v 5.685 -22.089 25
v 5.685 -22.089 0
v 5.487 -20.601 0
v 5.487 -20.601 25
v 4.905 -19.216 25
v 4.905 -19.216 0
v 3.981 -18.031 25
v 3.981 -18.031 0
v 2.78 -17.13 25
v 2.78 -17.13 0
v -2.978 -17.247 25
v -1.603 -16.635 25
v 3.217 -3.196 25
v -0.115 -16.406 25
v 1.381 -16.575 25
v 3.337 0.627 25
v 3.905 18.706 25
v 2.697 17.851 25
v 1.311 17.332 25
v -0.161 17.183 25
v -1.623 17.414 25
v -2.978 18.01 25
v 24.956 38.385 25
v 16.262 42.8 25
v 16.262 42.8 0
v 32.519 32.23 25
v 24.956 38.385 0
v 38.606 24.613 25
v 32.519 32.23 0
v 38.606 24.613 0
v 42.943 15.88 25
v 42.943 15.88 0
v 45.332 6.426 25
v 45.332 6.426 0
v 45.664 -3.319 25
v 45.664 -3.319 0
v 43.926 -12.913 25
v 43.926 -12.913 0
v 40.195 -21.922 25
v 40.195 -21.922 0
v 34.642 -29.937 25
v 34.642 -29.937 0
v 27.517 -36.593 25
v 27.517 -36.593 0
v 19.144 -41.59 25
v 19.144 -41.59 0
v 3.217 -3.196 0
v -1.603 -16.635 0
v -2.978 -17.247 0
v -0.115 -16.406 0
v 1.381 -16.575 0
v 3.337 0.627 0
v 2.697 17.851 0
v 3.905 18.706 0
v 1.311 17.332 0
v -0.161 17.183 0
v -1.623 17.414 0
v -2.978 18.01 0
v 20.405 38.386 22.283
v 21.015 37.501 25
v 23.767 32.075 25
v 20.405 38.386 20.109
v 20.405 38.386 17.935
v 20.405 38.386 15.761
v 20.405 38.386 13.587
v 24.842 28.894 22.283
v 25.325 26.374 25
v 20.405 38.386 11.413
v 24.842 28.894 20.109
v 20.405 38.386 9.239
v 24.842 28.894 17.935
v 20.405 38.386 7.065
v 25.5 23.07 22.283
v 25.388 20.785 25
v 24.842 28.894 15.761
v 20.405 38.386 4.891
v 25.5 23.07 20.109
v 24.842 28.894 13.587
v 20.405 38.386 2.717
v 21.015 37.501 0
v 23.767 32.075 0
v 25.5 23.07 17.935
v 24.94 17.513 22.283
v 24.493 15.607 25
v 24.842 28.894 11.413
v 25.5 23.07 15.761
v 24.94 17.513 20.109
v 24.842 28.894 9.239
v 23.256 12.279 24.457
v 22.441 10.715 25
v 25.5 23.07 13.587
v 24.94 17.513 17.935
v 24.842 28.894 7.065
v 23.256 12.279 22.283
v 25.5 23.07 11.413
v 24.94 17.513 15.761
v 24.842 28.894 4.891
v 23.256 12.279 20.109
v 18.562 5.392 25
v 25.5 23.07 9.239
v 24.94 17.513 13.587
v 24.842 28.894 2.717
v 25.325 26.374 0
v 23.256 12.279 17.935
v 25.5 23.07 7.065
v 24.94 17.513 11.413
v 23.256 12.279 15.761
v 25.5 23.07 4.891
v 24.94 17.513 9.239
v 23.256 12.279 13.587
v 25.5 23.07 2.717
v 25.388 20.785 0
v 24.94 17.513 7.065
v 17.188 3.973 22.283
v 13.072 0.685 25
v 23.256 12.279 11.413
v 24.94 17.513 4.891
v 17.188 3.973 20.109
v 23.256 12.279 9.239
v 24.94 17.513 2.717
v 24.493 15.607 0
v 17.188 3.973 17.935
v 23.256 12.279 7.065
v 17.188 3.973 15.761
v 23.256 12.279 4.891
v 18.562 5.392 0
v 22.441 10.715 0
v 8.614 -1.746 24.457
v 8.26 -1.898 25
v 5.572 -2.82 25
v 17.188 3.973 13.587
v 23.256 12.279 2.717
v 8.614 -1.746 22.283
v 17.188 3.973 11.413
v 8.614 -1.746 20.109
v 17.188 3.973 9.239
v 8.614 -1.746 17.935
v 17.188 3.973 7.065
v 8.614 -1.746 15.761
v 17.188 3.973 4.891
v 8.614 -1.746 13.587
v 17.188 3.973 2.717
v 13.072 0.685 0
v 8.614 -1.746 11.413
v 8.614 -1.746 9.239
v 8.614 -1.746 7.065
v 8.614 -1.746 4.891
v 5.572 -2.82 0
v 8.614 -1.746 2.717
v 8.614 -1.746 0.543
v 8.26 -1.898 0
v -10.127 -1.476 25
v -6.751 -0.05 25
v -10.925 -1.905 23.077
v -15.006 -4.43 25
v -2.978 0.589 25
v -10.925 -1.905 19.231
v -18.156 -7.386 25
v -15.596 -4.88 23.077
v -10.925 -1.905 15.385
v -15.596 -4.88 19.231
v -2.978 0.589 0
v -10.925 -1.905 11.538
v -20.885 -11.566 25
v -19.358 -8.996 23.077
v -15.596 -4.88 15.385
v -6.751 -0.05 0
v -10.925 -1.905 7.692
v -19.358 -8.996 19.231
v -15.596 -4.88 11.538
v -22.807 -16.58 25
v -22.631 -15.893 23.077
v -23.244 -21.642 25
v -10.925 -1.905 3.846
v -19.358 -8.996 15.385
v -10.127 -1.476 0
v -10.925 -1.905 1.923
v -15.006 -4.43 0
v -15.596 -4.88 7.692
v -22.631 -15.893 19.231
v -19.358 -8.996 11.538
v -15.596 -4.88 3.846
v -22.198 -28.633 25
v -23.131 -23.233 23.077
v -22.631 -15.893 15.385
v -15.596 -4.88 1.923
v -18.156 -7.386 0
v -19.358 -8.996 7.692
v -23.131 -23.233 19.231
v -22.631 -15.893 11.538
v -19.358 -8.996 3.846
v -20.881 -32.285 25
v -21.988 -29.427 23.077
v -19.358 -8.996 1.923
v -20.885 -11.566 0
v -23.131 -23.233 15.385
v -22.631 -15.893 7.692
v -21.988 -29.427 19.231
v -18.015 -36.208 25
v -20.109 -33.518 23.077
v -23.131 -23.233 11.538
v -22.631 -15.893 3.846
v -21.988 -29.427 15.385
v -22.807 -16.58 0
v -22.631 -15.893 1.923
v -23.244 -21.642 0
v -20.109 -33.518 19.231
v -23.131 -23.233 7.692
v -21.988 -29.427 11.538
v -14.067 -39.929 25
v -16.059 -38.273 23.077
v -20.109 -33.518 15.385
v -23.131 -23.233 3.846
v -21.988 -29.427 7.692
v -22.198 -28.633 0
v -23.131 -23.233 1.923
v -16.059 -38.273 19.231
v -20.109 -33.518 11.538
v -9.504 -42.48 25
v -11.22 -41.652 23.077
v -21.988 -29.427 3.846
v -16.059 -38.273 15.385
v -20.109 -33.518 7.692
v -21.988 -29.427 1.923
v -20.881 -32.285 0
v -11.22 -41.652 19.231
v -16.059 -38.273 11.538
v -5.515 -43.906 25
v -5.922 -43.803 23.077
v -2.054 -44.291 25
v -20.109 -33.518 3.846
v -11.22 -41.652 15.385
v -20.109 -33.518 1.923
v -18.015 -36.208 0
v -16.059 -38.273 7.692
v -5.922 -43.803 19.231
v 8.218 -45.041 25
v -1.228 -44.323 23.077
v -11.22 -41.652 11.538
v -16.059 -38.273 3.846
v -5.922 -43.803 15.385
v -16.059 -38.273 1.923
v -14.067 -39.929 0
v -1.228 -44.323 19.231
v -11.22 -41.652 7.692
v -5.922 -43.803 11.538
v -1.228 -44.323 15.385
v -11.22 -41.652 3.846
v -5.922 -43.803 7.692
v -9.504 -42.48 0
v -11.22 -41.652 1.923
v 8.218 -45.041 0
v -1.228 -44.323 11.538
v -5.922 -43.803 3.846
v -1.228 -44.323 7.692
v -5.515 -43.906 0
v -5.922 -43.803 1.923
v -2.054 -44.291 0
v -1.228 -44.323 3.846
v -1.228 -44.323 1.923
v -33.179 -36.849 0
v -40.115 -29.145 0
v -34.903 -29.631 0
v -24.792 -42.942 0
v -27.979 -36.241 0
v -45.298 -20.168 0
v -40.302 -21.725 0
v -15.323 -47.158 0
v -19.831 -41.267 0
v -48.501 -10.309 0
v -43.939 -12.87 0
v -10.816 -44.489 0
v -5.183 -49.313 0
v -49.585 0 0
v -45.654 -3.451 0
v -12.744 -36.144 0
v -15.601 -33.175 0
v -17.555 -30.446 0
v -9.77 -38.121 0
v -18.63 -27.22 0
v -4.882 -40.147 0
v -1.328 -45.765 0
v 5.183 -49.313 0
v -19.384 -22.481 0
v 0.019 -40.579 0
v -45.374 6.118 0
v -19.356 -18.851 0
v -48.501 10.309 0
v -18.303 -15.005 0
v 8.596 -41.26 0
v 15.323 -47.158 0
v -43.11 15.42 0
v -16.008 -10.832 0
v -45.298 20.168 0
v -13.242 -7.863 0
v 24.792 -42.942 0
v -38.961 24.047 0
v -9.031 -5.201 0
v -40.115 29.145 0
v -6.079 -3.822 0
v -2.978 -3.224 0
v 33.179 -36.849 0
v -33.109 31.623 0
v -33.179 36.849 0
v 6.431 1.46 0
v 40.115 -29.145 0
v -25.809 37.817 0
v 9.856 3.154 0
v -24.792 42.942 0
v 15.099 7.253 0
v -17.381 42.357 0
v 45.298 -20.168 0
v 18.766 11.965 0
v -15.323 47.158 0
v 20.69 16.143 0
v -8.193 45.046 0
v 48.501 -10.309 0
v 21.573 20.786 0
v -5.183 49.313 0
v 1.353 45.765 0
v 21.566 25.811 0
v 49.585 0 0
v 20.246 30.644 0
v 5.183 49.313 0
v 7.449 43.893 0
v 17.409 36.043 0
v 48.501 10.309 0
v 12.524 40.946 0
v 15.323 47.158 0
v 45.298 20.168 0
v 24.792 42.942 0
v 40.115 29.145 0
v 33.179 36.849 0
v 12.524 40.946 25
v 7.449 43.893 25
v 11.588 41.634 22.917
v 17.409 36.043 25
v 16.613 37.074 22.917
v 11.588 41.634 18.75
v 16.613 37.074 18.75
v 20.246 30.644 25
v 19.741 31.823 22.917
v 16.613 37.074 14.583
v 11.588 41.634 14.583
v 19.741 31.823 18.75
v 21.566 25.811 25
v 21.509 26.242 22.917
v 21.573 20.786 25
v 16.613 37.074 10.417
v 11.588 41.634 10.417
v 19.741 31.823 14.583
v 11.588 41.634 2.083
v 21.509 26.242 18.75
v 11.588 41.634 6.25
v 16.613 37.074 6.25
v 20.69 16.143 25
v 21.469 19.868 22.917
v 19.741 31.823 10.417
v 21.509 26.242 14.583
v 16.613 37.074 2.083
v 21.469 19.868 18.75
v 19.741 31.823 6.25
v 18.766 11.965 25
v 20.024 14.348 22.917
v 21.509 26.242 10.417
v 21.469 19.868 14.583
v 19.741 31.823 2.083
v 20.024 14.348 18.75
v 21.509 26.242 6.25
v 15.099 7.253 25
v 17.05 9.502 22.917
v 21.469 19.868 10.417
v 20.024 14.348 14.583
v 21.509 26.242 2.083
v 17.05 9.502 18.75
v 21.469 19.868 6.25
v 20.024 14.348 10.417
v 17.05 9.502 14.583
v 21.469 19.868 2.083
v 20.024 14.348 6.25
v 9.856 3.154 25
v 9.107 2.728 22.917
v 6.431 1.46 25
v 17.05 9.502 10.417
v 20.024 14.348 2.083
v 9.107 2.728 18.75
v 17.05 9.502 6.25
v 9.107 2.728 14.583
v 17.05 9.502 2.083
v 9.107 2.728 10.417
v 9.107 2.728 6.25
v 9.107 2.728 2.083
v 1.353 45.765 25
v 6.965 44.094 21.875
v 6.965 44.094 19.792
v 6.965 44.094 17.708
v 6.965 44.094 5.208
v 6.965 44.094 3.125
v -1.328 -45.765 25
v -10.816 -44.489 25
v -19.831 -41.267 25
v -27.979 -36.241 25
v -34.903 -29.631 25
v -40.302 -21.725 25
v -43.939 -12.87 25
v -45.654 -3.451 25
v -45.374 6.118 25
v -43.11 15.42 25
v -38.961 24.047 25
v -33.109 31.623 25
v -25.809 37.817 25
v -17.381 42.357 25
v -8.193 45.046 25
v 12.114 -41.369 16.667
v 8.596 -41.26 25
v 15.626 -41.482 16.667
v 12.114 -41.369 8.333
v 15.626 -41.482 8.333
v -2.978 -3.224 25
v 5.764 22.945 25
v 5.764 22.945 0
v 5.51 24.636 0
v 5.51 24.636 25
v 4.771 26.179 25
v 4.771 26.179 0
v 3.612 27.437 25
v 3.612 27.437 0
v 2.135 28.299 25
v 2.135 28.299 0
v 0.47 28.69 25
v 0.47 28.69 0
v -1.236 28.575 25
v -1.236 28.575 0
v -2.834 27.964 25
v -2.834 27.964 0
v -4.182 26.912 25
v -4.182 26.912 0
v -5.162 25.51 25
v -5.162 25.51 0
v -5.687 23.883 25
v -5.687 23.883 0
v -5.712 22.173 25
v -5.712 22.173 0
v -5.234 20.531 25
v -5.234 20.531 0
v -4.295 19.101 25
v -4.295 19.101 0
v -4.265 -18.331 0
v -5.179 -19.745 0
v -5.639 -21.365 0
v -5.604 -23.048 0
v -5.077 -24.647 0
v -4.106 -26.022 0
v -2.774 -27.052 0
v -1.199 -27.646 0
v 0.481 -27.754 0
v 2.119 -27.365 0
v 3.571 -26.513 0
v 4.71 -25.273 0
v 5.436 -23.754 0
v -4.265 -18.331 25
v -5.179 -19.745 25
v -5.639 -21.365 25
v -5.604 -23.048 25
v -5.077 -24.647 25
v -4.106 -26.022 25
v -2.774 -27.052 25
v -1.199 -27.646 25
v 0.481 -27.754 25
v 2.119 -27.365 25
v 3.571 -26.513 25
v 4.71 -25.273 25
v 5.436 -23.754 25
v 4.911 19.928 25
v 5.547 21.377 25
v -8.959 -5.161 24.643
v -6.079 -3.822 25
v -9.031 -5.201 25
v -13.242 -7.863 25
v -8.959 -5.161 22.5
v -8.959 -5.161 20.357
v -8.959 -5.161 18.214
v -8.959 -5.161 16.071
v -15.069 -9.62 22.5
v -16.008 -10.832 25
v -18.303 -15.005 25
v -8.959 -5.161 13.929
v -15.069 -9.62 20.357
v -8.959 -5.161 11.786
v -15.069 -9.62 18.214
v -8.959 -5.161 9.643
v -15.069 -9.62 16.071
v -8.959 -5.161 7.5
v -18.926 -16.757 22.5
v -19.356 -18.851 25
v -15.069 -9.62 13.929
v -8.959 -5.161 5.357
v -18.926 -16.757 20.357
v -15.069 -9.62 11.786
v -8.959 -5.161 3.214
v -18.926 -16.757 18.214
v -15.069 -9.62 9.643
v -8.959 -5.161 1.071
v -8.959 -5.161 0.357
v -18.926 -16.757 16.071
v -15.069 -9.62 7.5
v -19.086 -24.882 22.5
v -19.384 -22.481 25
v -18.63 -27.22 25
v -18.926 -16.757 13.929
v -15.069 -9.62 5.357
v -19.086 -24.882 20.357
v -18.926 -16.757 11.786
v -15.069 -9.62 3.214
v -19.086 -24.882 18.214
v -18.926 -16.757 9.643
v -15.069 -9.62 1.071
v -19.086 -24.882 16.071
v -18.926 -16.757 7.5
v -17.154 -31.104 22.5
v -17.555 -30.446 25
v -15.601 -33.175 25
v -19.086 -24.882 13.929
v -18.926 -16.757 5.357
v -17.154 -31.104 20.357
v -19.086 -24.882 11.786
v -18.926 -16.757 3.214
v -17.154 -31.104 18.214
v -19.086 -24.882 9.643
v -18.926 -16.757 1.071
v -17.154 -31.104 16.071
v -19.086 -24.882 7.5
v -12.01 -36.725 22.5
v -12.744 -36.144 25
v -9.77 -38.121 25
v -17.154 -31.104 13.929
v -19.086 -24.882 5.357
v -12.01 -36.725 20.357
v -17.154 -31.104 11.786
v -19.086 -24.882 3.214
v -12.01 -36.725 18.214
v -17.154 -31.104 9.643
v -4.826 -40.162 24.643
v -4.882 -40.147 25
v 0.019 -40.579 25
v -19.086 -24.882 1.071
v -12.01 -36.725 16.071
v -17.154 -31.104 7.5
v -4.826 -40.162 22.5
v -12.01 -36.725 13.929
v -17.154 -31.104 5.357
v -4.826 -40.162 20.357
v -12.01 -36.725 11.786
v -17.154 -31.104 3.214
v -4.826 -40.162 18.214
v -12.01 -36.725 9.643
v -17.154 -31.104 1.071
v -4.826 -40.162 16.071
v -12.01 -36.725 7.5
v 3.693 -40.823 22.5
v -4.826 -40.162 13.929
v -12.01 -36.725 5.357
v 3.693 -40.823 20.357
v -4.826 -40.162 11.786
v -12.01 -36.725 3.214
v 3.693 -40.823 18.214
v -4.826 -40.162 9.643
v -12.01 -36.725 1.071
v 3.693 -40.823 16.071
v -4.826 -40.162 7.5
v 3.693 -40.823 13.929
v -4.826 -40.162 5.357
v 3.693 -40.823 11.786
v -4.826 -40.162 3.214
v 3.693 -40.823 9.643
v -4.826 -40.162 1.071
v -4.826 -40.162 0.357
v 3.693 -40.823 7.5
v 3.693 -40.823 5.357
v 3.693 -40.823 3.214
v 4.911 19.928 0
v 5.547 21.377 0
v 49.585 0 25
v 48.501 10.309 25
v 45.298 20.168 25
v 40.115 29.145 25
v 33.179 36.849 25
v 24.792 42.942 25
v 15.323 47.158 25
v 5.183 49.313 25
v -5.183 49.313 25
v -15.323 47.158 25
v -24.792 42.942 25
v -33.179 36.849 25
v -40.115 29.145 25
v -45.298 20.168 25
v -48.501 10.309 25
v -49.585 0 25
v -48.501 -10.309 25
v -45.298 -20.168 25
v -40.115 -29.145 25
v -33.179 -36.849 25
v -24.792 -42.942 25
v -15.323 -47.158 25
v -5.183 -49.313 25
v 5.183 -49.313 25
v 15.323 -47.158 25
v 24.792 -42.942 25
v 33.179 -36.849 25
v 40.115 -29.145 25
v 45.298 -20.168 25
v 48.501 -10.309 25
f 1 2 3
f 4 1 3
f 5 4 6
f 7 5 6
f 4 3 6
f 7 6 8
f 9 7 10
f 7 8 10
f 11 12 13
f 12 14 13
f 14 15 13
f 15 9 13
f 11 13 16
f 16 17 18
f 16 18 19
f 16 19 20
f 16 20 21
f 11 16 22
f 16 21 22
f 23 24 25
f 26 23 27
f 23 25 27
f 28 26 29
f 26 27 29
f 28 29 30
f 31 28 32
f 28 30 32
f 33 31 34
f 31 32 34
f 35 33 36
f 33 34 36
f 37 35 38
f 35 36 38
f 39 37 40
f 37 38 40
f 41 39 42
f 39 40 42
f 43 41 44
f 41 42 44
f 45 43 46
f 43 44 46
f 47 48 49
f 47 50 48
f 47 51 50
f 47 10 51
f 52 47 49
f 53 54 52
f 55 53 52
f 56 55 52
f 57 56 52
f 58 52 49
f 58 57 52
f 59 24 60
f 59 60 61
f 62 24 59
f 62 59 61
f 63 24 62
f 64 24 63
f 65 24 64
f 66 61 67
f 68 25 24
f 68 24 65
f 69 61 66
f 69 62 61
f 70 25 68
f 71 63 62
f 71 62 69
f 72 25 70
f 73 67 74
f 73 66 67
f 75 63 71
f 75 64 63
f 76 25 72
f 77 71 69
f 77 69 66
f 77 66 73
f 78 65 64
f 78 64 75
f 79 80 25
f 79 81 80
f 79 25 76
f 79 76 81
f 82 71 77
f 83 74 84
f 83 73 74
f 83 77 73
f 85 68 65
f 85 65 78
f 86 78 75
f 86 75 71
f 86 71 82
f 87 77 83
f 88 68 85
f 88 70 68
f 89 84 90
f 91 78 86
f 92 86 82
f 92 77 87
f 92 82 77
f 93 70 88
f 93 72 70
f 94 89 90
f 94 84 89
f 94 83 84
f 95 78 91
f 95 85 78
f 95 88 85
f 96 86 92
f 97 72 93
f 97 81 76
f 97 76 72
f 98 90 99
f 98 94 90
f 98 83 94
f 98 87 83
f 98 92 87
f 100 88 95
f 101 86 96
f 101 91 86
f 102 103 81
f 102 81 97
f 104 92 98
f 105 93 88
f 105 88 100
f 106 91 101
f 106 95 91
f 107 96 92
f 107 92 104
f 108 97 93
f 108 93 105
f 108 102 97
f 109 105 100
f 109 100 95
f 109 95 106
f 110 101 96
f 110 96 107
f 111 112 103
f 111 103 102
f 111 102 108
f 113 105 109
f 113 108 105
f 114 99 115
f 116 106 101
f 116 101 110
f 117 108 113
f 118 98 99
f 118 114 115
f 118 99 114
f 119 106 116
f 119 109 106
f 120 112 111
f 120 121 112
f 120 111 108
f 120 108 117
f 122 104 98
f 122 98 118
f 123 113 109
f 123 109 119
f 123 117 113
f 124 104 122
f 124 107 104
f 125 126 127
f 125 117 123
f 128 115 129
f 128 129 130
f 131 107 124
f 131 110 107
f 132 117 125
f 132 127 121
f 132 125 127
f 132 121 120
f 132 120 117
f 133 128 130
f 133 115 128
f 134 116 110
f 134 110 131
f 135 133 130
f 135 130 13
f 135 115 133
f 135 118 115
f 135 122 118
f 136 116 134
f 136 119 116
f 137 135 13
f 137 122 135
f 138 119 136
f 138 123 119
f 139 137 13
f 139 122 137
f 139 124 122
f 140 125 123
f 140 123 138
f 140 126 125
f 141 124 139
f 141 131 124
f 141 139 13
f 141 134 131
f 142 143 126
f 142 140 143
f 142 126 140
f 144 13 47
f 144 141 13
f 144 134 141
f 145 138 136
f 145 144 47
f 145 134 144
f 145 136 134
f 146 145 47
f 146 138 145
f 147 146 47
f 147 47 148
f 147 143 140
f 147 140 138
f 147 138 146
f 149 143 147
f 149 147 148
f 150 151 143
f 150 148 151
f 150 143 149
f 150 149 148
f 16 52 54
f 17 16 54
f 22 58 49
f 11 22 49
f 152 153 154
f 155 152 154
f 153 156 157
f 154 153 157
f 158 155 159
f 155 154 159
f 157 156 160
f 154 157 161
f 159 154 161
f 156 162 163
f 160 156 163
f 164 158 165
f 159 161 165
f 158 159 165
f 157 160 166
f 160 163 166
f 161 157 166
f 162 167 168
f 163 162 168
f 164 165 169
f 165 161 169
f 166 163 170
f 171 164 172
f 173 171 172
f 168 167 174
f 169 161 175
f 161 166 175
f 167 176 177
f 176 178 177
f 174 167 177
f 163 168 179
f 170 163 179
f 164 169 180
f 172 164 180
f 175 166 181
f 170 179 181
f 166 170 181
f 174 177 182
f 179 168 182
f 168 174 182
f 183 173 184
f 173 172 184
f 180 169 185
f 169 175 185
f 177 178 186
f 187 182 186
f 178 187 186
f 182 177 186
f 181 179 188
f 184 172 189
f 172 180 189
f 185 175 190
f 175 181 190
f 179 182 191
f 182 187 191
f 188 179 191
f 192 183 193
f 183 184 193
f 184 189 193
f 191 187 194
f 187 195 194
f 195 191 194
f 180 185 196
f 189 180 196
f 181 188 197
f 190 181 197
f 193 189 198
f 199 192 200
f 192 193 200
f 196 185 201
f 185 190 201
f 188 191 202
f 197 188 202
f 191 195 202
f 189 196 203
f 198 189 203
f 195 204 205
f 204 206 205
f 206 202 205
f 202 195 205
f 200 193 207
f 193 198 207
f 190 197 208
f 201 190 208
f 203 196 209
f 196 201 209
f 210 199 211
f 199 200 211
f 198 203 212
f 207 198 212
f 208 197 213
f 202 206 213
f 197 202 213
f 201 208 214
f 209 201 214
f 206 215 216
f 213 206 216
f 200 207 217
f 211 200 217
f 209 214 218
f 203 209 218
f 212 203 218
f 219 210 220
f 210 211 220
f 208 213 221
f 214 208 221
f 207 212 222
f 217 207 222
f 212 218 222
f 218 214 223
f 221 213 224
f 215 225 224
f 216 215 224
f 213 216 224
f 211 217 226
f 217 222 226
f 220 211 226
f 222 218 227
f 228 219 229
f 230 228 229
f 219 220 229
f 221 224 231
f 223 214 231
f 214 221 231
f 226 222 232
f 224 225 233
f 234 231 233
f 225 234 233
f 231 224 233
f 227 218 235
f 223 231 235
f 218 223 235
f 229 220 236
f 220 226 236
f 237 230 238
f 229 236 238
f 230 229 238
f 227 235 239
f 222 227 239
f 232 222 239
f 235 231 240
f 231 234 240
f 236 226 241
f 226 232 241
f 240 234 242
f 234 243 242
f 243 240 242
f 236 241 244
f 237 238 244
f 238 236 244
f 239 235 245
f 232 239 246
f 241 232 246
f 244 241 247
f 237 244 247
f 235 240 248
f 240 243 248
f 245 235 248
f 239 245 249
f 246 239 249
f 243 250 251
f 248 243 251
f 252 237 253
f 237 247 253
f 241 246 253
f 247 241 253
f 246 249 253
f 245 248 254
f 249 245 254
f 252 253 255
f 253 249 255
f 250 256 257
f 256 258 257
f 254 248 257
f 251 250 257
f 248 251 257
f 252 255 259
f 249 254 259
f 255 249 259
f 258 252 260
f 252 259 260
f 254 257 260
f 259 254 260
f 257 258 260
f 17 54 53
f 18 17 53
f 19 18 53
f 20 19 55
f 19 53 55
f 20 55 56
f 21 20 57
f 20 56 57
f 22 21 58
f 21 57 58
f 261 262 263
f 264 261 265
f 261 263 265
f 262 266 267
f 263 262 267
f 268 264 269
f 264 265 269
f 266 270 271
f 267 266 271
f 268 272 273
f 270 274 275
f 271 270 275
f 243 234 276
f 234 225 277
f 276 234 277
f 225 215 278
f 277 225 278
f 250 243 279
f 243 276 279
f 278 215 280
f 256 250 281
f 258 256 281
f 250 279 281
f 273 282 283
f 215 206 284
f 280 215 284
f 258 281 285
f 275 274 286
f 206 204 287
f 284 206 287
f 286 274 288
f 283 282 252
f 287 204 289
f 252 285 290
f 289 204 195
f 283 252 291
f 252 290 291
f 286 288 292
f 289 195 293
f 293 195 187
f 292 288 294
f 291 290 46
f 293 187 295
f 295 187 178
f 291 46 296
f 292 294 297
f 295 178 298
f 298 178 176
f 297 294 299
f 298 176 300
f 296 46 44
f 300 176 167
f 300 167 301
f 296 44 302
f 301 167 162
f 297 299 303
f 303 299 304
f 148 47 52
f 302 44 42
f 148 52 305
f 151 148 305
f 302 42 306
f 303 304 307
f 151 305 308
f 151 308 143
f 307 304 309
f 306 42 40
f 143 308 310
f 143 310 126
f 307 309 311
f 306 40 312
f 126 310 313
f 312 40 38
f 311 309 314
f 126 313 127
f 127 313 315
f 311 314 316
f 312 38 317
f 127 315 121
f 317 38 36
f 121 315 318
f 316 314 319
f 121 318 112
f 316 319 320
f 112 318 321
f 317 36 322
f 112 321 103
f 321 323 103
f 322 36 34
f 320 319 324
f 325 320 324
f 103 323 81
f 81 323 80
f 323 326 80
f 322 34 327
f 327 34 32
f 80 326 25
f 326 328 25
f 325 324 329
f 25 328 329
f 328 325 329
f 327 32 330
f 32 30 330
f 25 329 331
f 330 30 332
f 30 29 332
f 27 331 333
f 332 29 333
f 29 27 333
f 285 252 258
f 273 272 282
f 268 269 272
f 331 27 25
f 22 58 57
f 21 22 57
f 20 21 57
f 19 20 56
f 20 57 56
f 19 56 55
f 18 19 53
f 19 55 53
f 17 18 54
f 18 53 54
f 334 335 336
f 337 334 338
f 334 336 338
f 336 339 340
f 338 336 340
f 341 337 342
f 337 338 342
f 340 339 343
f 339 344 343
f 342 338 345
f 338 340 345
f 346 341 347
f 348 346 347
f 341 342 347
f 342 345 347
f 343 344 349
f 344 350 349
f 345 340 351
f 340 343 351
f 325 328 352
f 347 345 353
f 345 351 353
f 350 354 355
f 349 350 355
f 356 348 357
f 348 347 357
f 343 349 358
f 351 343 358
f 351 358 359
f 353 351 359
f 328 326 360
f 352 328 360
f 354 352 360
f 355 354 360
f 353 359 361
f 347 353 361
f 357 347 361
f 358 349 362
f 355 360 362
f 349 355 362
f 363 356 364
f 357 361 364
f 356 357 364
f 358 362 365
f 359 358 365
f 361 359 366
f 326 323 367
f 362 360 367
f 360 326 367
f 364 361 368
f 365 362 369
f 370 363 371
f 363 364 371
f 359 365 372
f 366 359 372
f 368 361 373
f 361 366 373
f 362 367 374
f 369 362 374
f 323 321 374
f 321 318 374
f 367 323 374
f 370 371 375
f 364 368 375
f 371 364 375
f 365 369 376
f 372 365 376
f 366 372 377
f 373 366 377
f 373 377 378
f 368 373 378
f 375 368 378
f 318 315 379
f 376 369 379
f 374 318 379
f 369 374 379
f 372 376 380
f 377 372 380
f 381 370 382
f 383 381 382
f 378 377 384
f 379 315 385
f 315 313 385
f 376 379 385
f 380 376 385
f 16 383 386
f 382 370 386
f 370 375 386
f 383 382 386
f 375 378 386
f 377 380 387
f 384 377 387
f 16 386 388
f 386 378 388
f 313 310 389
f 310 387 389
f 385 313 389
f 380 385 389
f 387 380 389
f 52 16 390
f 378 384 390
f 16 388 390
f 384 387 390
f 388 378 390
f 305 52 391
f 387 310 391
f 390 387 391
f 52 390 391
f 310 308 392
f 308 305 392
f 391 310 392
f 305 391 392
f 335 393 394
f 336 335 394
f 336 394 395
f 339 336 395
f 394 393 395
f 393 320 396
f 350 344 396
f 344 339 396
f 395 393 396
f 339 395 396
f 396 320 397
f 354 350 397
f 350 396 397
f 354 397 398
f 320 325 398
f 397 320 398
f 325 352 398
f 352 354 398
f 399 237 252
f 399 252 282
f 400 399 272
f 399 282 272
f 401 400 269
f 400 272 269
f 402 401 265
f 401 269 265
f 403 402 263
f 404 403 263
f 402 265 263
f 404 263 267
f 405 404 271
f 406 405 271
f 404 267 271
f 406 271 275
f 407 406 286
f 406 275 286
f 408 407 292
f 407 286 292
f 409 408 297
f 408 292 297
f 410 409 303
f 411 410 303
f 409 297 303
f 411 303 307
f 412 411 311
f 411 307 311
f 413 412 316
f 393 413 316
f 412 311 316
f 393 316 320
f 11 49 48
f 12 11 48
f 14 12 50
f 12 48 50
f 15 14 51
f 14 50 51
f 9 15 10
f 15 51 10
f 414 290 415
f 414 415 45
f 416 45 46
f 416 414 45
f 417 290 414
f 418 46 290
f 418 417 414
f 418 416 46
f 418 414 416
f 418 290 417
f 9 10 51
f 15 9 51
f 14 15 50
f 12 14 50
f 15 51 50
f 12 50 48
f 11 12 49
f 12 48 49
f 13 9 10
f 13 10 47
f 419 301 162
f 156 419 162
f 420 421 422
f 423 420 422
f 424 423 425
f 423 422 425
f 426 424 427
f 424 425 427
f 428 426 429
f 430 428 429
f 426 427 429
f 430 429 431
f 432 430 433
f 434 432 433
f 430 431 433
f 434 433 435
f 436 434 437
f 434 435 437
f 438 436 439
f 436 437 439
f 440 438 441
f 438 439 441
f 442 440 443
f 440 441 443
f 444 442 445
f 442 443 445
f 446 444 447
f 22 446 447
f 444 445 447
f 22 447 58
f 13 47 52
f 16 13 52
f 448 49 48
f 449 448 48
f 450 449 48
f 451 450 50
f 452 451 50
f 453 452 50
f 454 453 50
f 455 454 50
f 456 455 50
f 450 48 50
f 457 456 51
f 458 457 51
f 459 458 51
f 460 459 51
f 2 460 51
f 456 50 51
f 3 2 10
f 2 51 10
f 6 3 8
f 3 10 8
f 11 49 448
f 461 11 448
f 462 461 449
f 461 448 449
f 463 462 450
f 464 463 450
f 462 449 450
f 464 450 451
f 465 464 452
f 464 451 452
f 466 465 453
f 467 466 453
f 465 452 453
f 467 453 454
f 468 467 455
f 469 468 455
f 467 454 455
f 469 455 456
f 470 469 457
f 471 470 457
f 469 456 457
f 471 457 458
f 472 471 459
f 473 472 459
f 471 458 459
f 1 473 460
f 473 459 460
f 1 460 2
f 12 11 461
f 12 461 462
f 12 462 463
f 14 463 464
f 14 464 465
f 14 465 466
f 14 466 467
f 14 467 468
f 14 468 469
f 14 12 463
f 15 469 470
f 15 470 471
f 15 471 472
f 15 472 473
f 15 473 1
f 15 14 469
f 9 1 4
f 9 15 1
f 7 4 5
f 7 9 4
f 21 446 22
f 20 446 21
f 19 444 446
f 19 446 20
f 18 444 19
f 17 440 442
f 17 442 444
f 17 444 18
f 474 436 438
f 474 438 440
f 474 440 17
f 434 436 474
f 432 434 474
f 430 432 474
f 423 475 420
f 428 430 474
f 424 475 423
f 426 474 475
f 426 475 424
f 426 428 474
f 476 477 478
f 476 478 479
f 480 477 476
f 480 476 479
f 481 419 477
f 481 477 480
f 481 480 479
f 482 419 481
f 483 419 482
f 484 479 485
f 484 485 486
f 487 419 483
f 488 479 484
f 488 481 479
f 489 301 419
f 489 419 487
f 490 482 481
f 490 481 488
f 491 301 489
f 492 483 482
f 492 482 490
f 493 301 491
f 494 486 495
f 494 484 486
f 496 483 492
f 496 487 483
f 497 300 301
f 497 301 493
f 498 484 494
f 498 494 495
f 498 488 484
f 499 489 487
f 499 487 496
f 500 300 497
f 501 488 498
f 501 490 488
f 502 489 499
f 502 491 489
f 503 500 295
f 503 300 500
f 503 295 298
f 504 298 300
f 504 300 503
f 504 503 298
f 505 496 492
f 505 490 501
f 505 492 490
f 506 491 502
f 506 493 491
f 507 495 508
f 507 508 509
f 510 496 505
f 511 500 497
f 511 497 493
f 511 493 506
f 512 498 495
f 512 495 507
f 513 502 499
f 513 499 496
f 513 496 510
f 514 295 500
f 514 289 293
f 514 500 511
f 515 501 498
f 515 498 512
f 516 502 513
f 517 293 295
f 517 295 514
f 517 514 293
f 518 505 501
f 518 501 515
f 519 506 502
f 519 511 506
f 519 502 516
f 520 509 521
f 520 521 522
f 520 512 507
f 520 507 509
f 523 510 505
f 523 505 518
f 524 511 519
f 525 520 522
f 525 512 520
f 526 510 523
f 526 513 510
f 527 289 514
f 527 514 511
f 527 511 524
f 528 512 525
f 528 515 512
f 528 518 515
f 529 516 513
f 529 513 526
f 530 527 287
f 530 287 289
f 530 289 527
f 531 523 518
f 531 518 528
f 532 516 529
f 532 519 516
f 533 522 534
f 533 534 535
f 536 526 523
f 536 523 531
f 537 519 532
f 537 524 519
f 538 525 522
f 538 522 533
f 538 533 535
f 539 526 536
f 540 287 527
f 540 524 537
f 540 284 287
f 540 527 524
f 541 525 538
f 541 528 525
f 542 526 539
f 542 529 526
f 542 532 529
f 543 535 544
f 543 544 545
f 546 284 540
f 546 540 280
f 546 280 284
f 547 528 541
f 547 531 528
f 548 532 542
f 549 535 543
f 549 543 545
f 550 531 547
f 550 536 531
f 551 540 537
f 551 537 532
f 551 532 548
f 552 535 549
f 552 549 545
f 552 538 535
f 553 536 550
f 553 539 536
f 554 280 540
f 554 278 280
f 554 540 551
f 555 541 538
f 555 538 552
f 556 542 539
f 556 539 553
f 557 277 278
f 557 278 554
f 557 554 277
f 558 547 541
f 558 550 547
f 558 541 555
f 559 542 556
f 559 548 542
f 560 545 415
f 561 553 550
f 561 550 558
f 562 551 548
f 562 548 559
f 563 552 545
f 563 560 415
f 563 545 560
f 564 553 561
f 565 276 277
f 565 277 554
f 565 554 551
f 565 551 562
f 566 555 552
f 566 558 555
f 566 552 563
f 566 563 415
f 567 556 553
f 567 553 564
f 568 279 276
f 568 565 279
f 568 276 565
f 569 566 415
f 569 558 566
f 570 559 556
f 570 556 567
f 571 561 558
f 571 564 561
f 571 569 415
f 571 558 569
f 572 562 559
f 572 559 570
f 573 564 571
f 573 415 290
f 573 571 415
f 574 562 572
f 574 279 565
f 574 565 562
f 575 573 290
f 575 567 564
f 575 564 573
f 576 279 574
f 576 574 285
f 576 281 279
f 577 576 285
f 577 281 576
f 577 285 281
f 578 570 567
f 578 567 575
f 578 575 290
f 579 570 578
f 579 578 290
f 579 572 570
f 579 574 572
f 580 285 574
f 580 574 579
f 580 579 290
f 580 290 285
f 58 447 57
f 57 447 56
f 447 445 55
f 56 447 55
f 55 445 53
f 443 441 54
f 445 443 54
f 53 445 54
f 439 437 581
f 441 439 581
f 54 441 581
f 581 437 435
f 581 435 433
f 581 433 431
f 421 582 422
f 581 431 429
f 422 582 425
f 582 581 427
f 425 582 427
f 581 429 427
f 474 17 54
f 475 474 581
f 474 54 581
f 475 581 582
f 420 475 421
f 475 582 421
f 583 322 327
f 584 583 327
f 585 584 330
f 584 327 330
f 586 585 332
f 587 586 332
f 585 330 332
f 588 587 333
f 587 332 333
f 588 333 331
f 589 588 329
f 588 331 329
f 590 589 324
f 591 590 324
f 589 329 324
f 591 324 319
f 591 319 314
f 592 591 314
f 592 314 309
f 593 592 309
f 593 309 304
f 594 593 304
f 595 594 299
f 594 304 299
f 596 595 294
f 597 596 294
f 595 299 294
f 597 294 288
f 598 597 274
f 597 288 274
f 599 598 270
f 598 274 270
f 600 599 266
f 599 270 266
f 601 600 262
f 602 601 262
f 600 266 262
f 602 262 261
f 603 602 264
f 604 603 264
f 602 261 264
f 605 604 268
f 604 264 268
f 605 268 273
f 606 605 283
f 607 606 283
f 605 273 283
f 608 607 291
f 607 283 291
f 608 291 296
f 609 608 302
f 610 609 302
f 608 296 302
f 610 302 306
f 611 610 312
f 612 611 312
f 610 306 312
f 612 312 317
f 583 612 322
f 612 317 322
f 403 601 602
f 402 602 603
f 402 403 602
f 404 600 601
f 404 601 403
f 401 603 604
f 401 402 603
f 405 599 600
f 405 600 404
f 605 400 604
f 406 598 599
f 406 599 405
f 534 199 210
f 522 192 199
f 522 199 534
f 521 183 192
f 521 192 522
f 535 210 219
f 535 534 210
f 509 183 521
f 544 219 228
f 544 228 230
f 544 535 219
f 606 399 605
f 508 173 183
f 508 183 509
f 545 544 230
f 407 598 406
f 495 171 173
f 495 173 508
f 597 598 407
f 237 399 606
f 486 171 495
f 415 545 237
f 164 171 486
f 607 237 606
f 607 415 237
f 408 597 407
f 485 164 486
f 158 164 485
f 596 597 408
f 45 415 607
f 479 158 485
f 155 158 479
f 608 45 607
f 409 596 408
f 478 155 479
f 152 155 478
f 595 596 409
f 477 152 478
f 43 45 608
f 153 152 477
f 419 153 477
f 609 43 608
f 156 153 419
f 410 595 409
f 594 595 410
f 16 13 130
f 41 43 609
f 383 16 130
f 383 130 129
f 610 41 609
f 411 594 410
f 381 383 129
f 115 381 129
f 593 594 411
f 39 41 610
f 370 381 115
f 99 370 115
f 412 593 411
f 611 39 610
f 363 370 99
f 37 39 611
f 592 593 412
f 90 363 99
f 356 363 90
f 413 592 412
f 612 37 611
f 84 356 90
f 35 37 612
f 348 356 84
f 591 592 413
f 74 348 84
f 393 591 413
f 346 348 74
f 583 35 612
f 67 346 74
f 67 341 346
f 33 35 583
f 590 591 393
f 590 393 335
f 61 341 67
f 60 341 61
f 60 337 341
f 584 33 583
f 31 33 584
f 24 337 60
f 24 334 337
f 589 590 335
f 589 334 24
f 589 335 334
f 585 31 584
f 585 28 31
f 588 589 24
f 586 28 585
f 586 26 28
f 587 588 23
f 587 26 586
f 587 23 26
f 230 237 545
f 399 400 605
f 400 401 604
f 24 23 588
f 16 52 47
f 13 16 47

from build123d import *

# Parameters (mm, degrees)
F0_R     = 49.5847500937
F1_DEPTH = 25
F2_DEPTH = 25
F3_DEPTH = 25


# Not quite as in the source:
# - ends of sketch curves that miss each other by under 0.0002 mm in the source are joined
# - the dataset's text gives a spline's control points without its knots; the knots are read off the source's solid


with BuildPart() as f1:
    # F0 (on Top) → F1 (new body)
    with BuildSketch(Plane.XY):
        Circle(F0_R)
        with BuildLine():
            ThreePointArc((8.2176634504, -45.0412423256), (-45.6544875488, -3.451270704), (1.3531451114, 45.7647517323))
            add(Edge.make_bspline(
                [(1.3531451114, 45.7647517323), (3.4585917741, 45.4072790873), (7.3287739419, 44.0760975566), (11.6846514785, 41.8714803536), (17.2036766267, 37.0102398582), (19.8127043525, 31.889785288), (21.8756398334, 26.5737392046), (21.6816430924, 19.8132738016), (20.3466547431, 14.27630368), (17.1645617239, 9.3955679535), (13.7143876632, 5.7022727088), (9.2995178681, 2.6106423405), (5.3224811985, 0.9250643675), (3.6571614218, 0.6611514177), (3.3374725899, 0.6271477481)],
                knots=[0, 0, 0, 0, 0.0402853124, 0.0764233093, 0.1198404643, 0.1588388833, 0.1972733831, 0.2391274731, 0.2779762224, 0.316692206, 0.3531523115, 0.3911291162, 0.4279852066, 0.4371528151, 0.4371528151, 0.4371528151, 0.4371528151], degree=3))
            Line((3.3374725899, 0.6271477481), (3.2173385291, -3.1964079792))
            add(Edge.make_bspline(
                [(16.2617436608, 42.799524033), (16.2630739599, 42.7983750489), (16.6394904754, 42.4732106597), (17.3858142501, 41.7990598434), (18.4668991951, 40.7220167717), (19.3182477466, 39.7747828486), (19.9617151083, 38.9817963008), (20.5615839282, 38.1849818374), (21.2321159557, 37.1896473658), (21.9256201889, 36.0080693011), (22.5259973397, 34.8525285732), (22.9670449801, 33.9153363369), (23.2921740837, 33.1906991104), (23.6162146728, 32.4472971946), (24.0143162389, 31.4754225057), (24.4609945217, 30.2335663035), (24.8545309775, 28.9083557538), (25.1186753026, 27.7330012889), (25.2798865775, 26.7470627199), (25.4025078808, 25.7623445898), (25.4919314322, 24.5315424236), (25.5196391676, 22.5777387036), (25.3996756527, 20.6638298862), (25.1756871665, 18.8523584922), (24.9517875546, 17.5113201902), (24.6589823135, 16.1822687794), (24.2868913691, 14.8644876192), (23.8274995758, 13.5611922588), (23.2686241638, 12.2690224458), (22.636234168, 11.0381846903), (21.7193953434, 9.4746754172), (20.7186347445, 8.0267968339), (19.6941212898, 6.7074239992), (18.6320508644, 5.4397638391), (17.2173630119, 3.9503603048), (15.3457425226, 2.3013523369), (13.2807742381, 0.7790477359), (11.410410694, -0.3634671801), (9.8292090796, -1.1911232786), (8.6167642486, -1.7574183512), (7.5946383314, -2.1736542592), (6.7725118163, -2.466207369), (6.1525609715, -2.6633692461), (5.5289556877, -2.8357079446), (4.8920257832, -2.9805203679), (4.2757329412, -3.0879036918), (3.7163451386, -3.1576990689), (3.3706493697, -3.1862748398), (3.2173385291, -3.1964079792)],
                knots=[0.0937222925, 0.0937222925, 0.0937222925, 0.0937222925, 0.09375, 0.1015625, 0.109375, 0.1171875, 0.12109375, 0.125, 0.1328125, 0.140625, 0.1484375, 0.15625, 0.16015625, 0.1640625, 0.171875, 0.1796875, 0.1875, 0.1953125, 0.19921875, 0.203125, 0.2109375, 0.21875, 0.234375, 0.2421875, 0.25, 0.2578125, 0.265625, 0.2734375, 0.28125, 0.2890625, 0.296875, 0.3125, 0.3203125, 0.328125, 0.34375, 0.359375, 0.375, 0.390625, 0.3984375, 0.40625, 0.4140625, 0.41796875, 0.421875, 0.42578125, 0.4296875, 0.43359375, 0.4375, 0.4407482936, 0.4407482936, 0.4407482936, 0.4407482936], degree=3))
            ThreePointArc((16.2617436608, 42.799524033), (45.7580748478, 1.562718476), (19.1438057271, -41.5903619256))
            add(Edge.make_bspline(
                [(8.5962909195, -41.260151535), (12.1204923737, -41.363963585), (15.6196042728, -41.4865498756), (19.1438057271, -41.5903619256)],
                knots=[0, 0, 0, 0, 10.5526824798, 10.5526824798, 10.5526824798, 10.5526824798], degree=3))
            add(Edge.make_bspline(
                [(-2.9778135602, -3.2238034948), (-3.0993303434, -3.2346970109), (-3.5226099021, -3.2765098979), (-4.0943616278, -3.3525652097), (-4.6705152555, -3.4541250007), (-5.0847144346, -3.5406614246), (-5.4738562213, -3.6363249493), (-5.9558372613, -3.7753006958), (-6.5569469588, -3.9870752932), (-7.2973844437, -4.3047776604), (-7.9556555023, -4.6280032377), (-8.5161141524, -4.9214653693), (-8.9557811473, -5.1586784651), (-9.4151958546, -5.4109743655), (-10.0219149467, -5.7502319027), (-10.7737966428, -6.1856132196), (-11.6435407711, -6.7225847478), (-12.4625455113, -7.2716014199), (-13.2068980448, -7.8239565682), (-13.8680607713, -8.3790853884), (-14.4836619801, -8.9673086499), (-15.0708287585, -9.6073944046), (-15.6482154954, -10.3231261961), (-16.2310819184, -11.1396443892), (-16.8226660281, -12.067261276), (-17.3931826033, -13.069530031), (-17.9227093669, -14.1204821222), (-18.3913882315, -15.1911115172), (-18.7164274723, -16.0743456961), (-18.9297942343, -16.7598333424), (-19.1092008222, -17.4224508448), (-19.3478650369, -18.567657804), (-19.5012310474, -20.2206869085), (-19.4387898602, -22.0343384025), (-19.2699656101, -23.6431361243), (-19.0923777518, -24.8846250566), (-18.8737440335, -26.1095288943), (-18.625273925, -27.270620982), (-18.3605406415, -28.3168815895), (-18.0961057427, -29.1935677611), (-17.8646757486, -29.8180269836), (-17.6428484123, -30.2970196235), (-17.4121763438, -30.7048654836), (-17.1614245266, -31.0964767945), (-16.9309413758, -31.4351019183), (-16.6635644382, -31.8102169288), (-16.2681781339, -32.3424050242), (-15.7106938903, -33.0521363879), (-14.975065644, -33.9229060282), (-14.2063314903, -34.7654131508), (-13.4425929357, -35.5306986434), (-12.7262486355, -36.1712848535), (-12.0138047109, -36.7340261464), (-11.2793708954, -37.2446124357), (-10.4901303857, -37.7297538058), (-9.6147303473, -38.2109085157), (-8.6369747009, -38.7013911181), (-7.6229933124, -39.1651555732), (-6.6109485553, -39.5814499067), (-5.6509540017, -39.9268354746), (-4.7939114132, -40.1807551658), (-4.129478245, -40.3228988125), (-3.4811896898, -40.4095071611), (-2.7268043347, -40.4629905381), (-1.938953452, -40.4930779164), (-1.1935823718, -40.5209796742), (-0.3766220477, -40.5570865106), (0.7204845182, -40.6162695454), (2.1546311267, -40.7083776943), (3.6813461565, -40.8200495776), (5.8114367714, -40.9930475683), (7.4814477769, -41.1477758014), (8.5962909195, -41.260151535)],
                knots=[0.4968401346, 0.4968401346, 0.4968401346, 0.4968401346, 0.5, 0.5078125, 0.51171875, 0.515625, 0.51953125, 0.5234375, 0.53125, 0.5390625, 0.546875, 0.55078125, 0.5546875, 0.55859375, 0.5625, 0.5703125, 0.578125, 0.5859375, 0.59375, 0.6015625, 0.609375, 0.6171875, 0.625, 0.6328125, 0.640625, 0.6484375, 0.65625, 0.6640625, 0.671875, 0.67578125, 0.6796875, 0.6875, 0.703125, 0.71875, 0.7265625, 0.734375, 0.7421875, 0.75, 0.7578125, 0.765625, 0.7734375, 0.78125, 0.7890625, 0.79296875, 0.796875, 0.80078125, 0.8046875, 0.8125, 0.8203125, 0.828125, 0.8359375, 0.84375, 0.8515625, 0.859375, 0.8671875, 0.875, 0.8828125, 0.890625, 0.8984375, 0.90625, 0.9140625, 0.921875, 0.9296875, 0.9375, 0.9453125, 0.94921875, 0.953125, 0.9609375, 0.96875, 0.9765625, 0.984375, 0.9999882092, 0.9999882092, 0.9999882092, 0.9999882092], degree=3))
            Line((-2.9778135602, -3.2238034948), (-2.9778135602, 0.5890359777))
            add(Edge.make_bspline(
                [(-2.9778135602, 0.5890359777), (-4.1586395197, 0.4998871799), (-7.1372789822, 0.0721815891), (-10.9327858042, -1.8493664697), (-15.8365992647, -4.7241770818), (-19.6150340779, -8.8239411152), (-23.2426783003, -16.0189399303), (-23.4442169592, -23.0198313597), (-21.9307663935, -30.3724139092), (-20.290749593, -33.533767655), (-15.9904342503, -38.7653797506), (-11.4707989198, -41.7321009373), (-5.4131902795, -44.2598907097), (-1.1384676764, -44.2508911848), (4.71151601, -44.6877810107), (8.2176634504, -45.0412423256)],
                knots=[0.4943508245, 0.4943508245, 0.4943508245, 0.4943508245, 0.5204850635, 0.5559023161, 0.5940839436, 0.6325130511, 0.6778144538, 0.7214796109, 0.7649859717, 0.7959800891, 0.8371789433, 0.8760457564, 0.9164461256, 0.9499850996, 1, 1, 1, 1], degree=3))
        make_face(mode=Mode.SUBTRACT)
    extrude(amount=F1_DEPTH)


with BuildPart() as f2:
    # F0 (on Top) → F2 (new body)
    with BuildSketch(Plane.XY):
        with BuildLine():
            ThreePointArc((-2.9778135602, 18.0099472335), (0.579881213, 17.2103989752), (3.905499446, 18.705970065))
            ThreePointArc((3.905499446, 18.705970065), (5.2789490027, 20.6308047759), (5.7639747523, 22.9451302439))
            ThreePointArc((5.7639747523, 22.9451302439), (-2.8336692438, 27.9644652159), (-2.9778135602, 18.0099472335))
        make_face()
    extrude(amount=F2_DEPTH)


with BuildPart() as f2b:
    # F0 (on Top) → F2, piece 2 (new body)
    with BuildSketch(Plane.XY):
        with BuildLine():
            ThreePointArc((5.6849669477, -22.0894254744), (4.9051228964, -19.2156442427), (2.7795433476, -17.1302936981))
            ThreePointArc((2.7795433476, -17.1302936981), (-0.1149715971, -16.4056212266), (-2.9778135602, -17.2467531133))
            ThreePointArc((-2.9778135602, -17.2467531133), (-2.7739932886, -27.051663924), (5.6849669477, -22.0894254744))
        make_face()
    extrude(amount=F2_DEPTH)


with BuildPart() as f3:
    # F0 (on Top) → F3 (new body)
    with BuildSketch(Plane.XY):
        with BuildLine():
            add(Edge.make_bspline(
                [(3.3374725899, 0.6271477481), (2.7022433704, 0.5595816578), (1.179826551, 0.5744434161), (-0.8120762037, 0.7033344618), (-2.5254644471, 0.6231869712), (-2.9778135602, 0.5890359777)],
                knots=[0.4371528151, 0.4371528151, 0.4371528151, 0.4371528151, 0.4553690688, 0.4843393577, 0.4943508245, 0.4943508245, 0.4943508245, 0.4943508245], degree=3))
            Line((3.3374725899, 0.6271477481), (3.905499446, 18.705970065))
            ThreePointArc((3.905499446, 18.705970065), (0.579881213, 17.2103989752), (-2.9778135602, 18.0099472335))
            Line((-2.9778135602, 18.0099472335), (-2.9778135602, 0.5890359777))
        make_face()
        with BuildLine():
            Line((2.7795433476, -17.1302936981), (3.2173385291, -3.1964079792))
            add(Edge.make_bspline(
                [(3.2173385291, -3.1964079792), (3.0019201003, -3.2106461438), (2.4372674095, -3.2340467099), (1.7724022915, -3.2260045079), (1.2057258422, -3.207691837), (0.6565254191, -3.1863181965), (-0.002185073, -3.1588329743), (-0.7797750652, -3.1381263752), (-1.5744376242, -3.1401181706), (-2.3217399341, -3.1714582791), (-2.7988903766, -3.2077637137), (-2.9778135602, -3.2238034948)],
                knots=[0.4407482936, 0.4407482936, 0.4407482936, 0.4407482936, 0.4453125, 0.453125, 0.45703125, 0.4609375, 0.46875, 0.4765625, 0.484375, 0.4921875, 0.4968401346, 0.4968401346, 0.4968401346, 0.4968401346], degree=3))
            Line((-2.9778135602, -3.2238034948), (-2.9778135602, -17.2467531133))
            ThreePointArc((-2.9778135602, -17.2467531133), (-0.1149715971, -16.4056212266), (2.7795433476, -17.1302936981))
        make_face()
        with BuildLine():
            Line((3.2173385291, -3.1964079792), (3.3374725899, 0.6271477481))
            add(Edge.make_bspline(
                [(3.3374725899, 0.6271477481), (2.7022433704, 0.5595816578), (1.179826551, 0.5744434161), (-0.8120762037, 0.7033344618), (-2.5254644471, 0.6231869712), (-2.9778135602, 0.5890359777)],
                knots=[0.4371528151, 0.4371528151, 0.4371528151, 0.4371528151, 0.4553690688, 0.4843393577, 0.4943508245, 0.4943508245, 0.4943508245, 0.4943508245], degree=3))
            Line((-2.9778135602, 0.5890359777), (-2.9778135602, -3.2238034948))
            add(Edge.make_bspline(
                [(3.2173385291, -3.1964079792), (3.0019201003, -3.2106461438), (2.4372674095, -3.2340467099), (1.7724022915, -3.2260045079), (1.2057258422, -3.207691837), (0.6565254191, -3.1863181965), (-0.002185073, -3.1588329743), (-0.7797750652, -3.1381263752), (-1.5744376242, -3.1401181706), (-2.3217399341, -3.1714582791), (-2.7988903766, -3.2077637137), (-2.9778135602, -3.2238034948)],
                knots=[0.4407482936, 0.4407482936, 0.4407482936, 0.4407482936, 0.4453125, 0.453125, 0.45703125, 0.4609375, 0.46875, 0.4765625, 0.484375, 0.4921875, 0.4968401346, 0.4968401346, 0.4968401346, 0.4968401346], degree=3))
        make_face()
    extrude(amount=F3_DEPTH)


solid = Compound([f1.part, f2.part, f2b.part, f3.part])
